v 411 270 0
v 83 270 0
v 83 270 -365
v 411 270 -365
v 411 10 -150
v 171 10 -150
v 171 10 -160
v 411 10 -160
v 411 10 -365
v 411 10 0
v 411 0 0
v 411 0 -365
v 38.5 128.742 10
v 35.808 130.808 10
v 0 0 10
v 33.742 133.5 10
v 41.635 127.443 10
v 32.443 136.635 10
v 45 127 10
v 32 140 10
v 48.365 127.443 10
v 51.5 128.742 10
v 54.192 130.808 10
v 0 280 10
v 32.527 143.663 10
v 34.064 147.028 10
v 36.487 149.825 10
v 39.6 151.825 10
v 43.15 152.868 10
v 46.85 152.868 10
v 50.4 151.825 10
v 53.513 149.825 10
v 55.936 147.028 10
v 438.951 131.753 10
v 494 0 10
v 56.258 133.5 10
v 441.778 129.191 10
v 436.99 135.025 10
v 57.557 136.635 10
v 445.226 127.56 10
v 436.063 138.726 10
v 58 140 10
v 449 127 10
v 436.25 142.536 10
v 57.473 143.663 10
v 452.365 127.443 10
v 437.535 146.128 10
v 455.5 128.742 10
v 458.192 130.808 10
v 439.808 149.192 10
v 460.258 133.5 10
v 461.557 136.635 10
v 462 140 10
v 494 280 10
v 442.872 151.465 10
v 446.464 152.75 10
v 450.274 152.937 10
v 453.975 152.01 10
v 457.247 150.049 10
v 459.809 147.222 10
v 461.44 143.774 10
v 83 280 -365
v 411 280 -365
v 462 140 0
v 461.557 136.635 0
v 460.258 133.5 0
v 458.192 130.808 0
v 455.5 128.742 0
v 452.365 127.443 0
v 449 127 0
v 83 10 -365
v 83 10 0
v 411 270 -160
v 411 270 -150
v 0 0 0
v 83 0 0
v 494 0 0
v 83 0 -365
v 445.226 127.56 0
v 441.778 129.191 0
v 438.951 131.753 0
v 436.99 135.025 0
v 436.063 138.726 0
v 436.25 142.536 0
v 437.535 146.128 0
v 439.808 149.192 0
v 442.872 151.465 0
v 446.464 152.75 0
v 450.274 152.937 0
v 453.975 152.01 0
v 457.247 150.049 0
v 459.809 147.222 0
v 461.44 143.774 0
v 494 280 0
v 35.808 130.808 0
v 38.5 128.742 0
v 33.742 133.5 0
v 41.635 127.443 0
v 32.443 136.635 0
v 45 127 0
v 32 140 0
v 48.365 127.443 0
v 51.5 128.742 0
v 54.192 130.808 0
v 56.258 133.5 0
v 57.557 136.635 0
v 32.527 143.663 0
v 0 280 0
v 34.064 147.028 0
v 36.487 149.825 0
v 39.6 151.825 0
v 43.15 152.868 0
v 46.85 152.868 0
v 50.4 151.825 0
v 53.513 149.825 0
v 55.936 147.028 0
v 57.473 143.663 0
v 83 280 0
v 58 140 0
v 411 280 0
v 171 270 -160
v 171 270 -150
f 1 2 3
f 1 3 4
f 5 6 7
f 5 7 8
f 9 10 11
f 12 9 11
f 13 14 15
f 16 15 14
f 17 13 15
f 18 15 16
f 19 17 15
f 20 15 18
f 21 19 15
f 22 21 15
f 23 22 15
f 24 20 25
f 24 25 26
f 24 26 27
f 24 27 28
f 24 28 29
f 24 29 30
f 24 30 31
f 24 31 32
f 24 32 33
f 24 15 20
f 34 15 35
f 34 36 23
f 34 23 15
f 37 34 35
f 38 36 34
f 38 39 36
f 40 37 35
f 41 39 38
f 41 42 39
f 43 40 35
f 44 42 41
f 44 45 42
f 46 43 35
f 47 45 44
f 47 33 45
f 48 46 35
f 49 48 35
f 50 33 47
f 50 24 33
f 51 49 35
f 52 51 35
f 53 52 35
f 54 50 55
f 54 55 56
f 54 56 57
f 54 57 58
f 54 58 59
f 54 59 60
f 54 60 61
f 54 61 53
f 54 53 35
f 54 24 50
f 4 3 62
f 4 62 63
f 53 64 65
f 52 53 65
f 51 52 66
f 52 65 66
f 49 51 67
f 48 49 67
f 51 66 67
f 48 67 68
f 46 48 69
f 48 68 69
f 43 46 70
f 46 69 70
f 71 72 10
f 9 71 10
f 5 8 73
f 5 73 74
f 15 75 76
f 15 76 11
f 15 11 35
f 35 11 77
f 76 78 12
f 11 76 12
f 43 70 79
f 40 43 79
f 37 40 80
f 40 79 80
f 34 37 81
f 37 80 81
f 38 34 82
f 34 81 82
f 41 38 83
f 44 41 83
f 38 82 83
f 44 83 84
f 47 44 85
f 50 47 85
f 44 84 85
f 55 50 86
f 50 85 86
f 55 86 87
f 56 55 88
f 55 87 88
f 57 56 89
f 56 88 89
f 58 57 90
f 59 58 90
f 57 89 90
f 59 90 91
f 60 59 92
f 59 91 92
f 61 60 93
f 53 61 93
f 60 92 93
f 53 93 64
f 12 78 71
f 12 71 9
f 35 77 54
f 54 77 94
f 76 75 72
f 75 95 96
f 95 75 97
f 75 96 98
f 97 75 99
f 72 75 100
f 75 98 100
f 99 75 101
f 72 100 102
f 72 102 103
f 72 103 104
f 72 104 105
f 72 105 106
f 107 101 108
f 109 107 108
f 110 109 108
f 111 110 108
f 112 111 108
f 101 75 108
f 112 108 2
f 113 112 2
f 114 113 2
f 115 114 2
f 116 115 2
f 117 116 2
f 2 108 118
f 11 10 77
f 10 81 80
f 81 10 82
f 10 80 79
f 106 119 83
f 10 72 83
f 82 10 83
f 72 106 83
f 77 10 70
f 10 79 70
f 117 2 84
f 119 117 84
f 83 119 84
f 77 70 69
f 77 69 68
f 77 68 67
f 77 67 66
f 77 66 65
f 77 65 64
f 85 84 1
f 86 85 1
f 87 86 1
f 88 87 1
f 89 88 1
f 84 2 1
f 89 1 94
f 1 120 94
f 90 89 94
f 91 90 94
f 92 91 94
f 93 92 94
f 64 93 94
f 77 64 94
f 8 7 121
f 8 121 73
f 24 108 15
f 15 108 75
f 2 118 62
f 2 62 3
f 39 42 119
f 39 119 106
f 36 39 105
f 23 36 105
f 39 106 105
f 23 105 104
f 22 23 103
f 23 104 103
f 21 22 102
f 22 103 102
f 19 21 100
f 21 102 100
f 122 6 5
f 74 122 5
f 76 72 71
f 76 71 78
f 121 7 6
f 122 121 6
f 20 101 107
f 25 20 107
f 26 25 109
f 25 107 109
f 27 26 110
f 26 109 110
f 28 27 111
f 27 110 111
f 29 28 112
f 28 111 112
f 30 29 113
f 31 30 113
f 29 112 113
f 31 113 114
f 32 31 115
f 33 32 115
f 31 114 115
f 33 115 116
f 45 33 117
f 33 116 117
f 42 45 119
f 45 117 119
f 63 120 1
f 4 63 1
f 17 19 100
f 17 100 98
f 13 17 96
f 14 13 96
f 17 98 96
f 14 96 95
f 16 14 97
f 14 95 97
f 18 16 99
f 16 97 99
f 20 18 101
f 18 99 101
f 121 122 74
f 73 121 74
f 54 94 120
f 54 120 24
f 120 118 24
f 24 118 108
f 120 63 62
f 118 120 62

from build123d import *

# Parameters (mm, degrees)
F1_DEPTH = 10
F2_W     = 328
F2_H     = 10
F3_DEPTH = 365
F4_W     = 240
F4_H     = 10
F5_DEPTH = 260


with BuildPart() as f1:
    # F0 (on Top) → F1 (new body)
    with BuildSketch(Plane.XY):
        with BuildLine():
            Line((0, 140), (0, 0))
            Line((0, 0), (45, 0))
            Line((45, 0), (45, 127))
            ThreePointArc((45, 127), (35.807612, 130.807612), (32, 140))
            Line((32, 140), (0, 140))
        make_face()
        with BuildLine():
            Line((45, 127), (45, 0))
            Line((45, 0), (449, 0))
            Line((449, 0), (449, 127))
            ThreePointArc((449, 127), (439.807612, 149.192388), (462, 140))
            Line((462, 140), (494, 140))
            Line((494, 140), (494, 280))
            Line((494, 280), (0, 280))
            Line((0, 280), (0, 140))
            Line((0, 140), (32, 140))
            ThreePointArc((32, 140), (45, 153), (58, 140))
            ThreePointArc((58, 140), (54.192388, 130.807612), (45, 127))
        make_face()
        with BuildLine():
            Line((449, 127), (449, 0))
            Line((449, 0), (494, 0))
            Line((494, 0), (494, 140))
            Line((494, 140), (462, 140))
            ThreePointArc((462, 140), (458.192388, 130.807612), (449, 127))
        make_face()
    extrude(amount=F1_DEPTH)

    # F2 (on face) → F3 (join)
    with BuildSketch(Plane(origin=(0, 0, 0), x_dir=(1, 0, 0), z_dir=(0, 0, -1))):
        with Locations((247, -275)):
            Rectangle(F2_W, F2_H)
        with Locations((247, -5)):
            Rectangle(F2_W, F2_H)
    extrude(amount=F3_DEPTH)


with BuildPart() as f5:
    # F4 (on face) → F5 (new body)
    with BuildSketch(Plane.XZ.offset(-270)):
        with Locations((291, -155)):
            Rectangle(F4_W, F4_H)
    extrude(amount=F5_DEPTH)


solid = Compound([f1.part, f5.part])
